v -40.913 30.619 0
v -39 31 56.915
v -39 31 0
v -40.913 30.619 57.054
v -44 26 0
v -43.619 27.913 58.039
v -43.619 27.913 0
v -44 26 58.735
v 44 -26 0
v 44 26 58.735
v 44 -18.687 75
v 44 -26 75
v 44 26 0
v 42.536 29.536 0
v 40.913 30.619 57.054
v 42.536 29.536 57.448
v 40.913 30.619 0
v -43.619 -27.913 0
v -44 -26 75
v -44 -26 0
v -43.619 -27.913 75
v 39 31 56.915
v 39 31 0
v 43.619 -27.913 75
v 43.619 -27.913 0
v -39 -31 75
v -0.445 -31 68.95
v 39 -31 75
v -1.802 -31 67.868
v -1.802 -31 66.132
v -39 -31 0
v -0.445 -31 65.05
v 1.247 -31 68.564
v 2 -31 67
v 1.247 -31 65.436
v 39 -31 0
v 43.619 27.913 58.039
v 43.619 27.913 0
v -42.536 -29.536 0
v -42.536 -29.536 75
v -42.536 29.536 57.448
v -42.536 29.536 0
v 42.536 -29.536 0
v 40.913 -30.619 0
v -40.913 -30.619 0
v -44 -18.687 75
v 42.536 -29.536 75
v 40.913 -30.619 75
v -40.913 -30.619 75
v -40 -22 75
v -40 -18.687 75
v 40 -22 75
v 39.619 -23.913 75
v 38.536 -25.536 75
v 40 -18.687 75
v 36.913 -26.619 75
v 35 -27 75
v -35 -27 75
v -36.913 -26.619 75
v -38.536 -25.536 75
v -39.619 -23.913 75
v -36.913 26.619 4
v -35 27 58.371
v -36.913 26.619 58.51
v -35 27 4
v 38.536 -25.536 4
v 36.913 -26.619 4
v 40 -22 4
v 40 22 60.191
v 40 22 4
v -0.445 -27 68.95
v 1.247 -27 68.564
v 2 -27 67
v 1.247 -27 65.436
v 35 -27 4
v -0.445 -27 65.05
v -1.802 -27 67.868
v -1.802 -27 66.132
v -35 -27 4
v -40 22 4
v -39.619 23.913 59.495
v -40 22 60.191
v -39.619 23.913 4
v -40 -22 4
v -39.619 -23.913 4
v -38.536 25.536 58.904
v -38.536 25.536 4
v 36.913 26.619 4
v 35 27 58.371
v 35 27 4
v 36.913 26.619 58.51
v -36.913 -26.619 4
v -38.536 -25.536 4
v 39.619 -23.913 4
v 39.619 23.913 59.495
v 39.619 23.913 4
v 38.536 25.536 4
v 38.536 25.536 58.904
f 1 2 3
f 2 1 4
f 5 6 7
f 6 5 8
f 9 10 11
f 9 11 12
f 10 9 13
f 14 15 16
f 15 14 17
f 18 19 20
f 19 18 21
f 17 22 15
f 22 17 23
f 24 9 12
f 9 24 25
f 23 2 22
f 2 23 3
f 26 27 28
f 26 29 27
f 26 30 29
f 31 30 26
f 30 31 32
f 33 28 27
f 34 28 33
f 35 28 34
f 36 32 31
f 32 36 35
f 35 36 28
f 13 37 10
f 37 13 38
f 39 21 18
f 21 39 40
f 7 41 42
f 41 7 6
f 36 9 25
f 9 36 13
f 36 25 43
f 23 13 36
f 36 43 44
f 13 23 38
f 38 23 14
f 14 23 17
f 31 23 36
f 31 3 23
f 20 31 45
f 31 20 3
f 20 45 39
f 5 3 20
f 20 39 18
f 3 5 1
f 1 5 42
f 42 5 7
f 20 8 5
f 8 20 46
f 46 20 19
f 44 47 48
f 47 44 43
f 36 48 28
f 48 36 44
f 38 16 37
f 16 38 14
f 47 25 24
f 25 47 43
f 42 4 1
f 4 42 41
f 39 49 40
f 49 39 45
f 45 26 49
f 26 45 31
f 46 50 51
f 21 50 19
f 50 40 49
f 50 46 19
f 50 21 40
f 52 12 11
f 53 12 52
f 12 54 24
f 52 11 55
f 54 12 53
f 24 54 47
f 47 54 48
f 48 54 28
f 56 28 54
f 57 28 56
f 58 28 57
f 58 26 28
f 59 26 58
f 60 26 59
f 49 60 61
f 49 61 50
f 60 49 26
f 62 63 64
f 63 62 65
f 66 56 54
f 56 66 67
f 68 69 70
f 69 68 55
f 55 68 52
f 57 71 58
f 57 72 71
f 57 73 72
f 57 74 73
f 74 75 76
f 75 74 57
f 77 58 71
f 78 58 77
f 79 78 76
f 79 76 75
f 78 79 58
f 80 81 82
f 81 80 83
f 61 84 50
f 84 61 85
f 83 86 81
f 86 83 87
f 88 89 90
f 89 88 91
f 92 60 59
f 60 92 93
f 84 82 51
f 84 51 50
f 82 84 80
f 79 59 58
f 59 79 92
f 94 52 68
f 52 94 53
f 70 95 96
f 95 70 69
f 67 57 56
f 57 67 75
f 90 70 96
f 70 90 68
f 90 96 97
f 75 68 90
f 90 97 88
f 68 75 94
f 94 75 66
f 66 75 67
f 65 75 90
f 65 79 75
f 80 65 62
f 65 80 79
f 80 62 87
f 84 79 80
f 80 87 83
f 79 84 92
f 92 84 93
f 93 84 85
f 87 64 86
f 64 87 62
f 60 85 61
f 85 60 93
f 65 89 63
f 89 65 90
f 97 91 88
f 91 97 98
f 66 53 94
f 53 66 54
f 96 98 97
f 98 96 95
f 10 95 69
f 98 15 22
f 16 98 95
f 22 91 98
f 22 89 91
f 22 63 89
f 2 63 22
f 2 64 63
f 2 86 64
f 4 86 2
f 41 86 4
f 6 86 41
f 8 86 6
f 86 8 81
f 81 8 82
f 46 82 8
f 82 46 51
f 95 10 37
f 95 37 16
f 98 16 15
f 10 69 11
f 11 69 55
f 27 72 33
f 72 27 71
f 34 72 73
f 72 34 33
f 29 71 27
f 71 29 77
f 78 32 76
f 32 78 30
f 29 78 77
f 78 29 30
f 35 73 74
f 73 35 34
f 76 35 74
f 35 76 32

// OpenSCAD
//additional parameters
corner_radius = 5;      // radius of box corners
wall_thickness = 4;     // total thickness of any wall
post_diameter = 10;     // internal post for screws
hole_diameter = 3;      // size of screws for lid (0=no screws)
lid_thickness= 0;       // comment out if no lid required
lid_lip = 2;            // 0 makes lid flush to top
lid_tolerance = .5;     // shrink lid so not squeaky fit

FUDGE=2;

//INSIDE dimensions of the box
width  = 78 + wall_thickness * 2 + FUDGE;    //x dimension
length = 52 + wall_thickness * 2 + FUDGE;    //y dimension
height = 75;    //z dimension

fn=50;

// make 4 "posts" about 0,0,0 offset by +/-x +/-y 
module posts(x,y,z,h,r)
{
    translate([x,y,z]){         // move post to this location
        cylinder(r = r, h = h); // make one post
    }
    translate([-x,y,z]){        // move post to this location
        cylinder(r = r, h = h); // make one post
    }   
    translate([-x,-y,z]){       // move post to this location
        cylinder(r = r, h = h); // make one post
    }
    translate([x,-y,z]){        // move post to this location
        cylinder(r = r, h = h); // make one post
    }    
}

module make_box()
{
    difference() { // make 2 boxes one inside the other and remove "inside box" from "outside box"
        // use posts to define OUTSIDE of a solid box centered on 0,0
        hull(){
            posts(  
                x=(width/2  - corner_radius),
                y=(length/2 - corner_radius),
                z= 0,
                h= height,
                r = corner_radius);
        }
            
        // use posts to define INSIDE of a solid box centered on 0,0
        hull(){
            posts(
                x=(width/2  - corner_radius - wall_thickness),
                y=(length/2 - corner_radius - wall_thickness),
                z= wall_thickness, // move up to create bottom
                h= height,
                r = corner_radius);
        }

    }
}

difference()
{
    make_box();
    translate([-50, 50, 50])
    rotate([70,0,0])
    cube([100,100,100]);
    
    translate([0, 50, 67])
    rotate([90,0,0])
    #cylinder(h =100, d= 4);
}
